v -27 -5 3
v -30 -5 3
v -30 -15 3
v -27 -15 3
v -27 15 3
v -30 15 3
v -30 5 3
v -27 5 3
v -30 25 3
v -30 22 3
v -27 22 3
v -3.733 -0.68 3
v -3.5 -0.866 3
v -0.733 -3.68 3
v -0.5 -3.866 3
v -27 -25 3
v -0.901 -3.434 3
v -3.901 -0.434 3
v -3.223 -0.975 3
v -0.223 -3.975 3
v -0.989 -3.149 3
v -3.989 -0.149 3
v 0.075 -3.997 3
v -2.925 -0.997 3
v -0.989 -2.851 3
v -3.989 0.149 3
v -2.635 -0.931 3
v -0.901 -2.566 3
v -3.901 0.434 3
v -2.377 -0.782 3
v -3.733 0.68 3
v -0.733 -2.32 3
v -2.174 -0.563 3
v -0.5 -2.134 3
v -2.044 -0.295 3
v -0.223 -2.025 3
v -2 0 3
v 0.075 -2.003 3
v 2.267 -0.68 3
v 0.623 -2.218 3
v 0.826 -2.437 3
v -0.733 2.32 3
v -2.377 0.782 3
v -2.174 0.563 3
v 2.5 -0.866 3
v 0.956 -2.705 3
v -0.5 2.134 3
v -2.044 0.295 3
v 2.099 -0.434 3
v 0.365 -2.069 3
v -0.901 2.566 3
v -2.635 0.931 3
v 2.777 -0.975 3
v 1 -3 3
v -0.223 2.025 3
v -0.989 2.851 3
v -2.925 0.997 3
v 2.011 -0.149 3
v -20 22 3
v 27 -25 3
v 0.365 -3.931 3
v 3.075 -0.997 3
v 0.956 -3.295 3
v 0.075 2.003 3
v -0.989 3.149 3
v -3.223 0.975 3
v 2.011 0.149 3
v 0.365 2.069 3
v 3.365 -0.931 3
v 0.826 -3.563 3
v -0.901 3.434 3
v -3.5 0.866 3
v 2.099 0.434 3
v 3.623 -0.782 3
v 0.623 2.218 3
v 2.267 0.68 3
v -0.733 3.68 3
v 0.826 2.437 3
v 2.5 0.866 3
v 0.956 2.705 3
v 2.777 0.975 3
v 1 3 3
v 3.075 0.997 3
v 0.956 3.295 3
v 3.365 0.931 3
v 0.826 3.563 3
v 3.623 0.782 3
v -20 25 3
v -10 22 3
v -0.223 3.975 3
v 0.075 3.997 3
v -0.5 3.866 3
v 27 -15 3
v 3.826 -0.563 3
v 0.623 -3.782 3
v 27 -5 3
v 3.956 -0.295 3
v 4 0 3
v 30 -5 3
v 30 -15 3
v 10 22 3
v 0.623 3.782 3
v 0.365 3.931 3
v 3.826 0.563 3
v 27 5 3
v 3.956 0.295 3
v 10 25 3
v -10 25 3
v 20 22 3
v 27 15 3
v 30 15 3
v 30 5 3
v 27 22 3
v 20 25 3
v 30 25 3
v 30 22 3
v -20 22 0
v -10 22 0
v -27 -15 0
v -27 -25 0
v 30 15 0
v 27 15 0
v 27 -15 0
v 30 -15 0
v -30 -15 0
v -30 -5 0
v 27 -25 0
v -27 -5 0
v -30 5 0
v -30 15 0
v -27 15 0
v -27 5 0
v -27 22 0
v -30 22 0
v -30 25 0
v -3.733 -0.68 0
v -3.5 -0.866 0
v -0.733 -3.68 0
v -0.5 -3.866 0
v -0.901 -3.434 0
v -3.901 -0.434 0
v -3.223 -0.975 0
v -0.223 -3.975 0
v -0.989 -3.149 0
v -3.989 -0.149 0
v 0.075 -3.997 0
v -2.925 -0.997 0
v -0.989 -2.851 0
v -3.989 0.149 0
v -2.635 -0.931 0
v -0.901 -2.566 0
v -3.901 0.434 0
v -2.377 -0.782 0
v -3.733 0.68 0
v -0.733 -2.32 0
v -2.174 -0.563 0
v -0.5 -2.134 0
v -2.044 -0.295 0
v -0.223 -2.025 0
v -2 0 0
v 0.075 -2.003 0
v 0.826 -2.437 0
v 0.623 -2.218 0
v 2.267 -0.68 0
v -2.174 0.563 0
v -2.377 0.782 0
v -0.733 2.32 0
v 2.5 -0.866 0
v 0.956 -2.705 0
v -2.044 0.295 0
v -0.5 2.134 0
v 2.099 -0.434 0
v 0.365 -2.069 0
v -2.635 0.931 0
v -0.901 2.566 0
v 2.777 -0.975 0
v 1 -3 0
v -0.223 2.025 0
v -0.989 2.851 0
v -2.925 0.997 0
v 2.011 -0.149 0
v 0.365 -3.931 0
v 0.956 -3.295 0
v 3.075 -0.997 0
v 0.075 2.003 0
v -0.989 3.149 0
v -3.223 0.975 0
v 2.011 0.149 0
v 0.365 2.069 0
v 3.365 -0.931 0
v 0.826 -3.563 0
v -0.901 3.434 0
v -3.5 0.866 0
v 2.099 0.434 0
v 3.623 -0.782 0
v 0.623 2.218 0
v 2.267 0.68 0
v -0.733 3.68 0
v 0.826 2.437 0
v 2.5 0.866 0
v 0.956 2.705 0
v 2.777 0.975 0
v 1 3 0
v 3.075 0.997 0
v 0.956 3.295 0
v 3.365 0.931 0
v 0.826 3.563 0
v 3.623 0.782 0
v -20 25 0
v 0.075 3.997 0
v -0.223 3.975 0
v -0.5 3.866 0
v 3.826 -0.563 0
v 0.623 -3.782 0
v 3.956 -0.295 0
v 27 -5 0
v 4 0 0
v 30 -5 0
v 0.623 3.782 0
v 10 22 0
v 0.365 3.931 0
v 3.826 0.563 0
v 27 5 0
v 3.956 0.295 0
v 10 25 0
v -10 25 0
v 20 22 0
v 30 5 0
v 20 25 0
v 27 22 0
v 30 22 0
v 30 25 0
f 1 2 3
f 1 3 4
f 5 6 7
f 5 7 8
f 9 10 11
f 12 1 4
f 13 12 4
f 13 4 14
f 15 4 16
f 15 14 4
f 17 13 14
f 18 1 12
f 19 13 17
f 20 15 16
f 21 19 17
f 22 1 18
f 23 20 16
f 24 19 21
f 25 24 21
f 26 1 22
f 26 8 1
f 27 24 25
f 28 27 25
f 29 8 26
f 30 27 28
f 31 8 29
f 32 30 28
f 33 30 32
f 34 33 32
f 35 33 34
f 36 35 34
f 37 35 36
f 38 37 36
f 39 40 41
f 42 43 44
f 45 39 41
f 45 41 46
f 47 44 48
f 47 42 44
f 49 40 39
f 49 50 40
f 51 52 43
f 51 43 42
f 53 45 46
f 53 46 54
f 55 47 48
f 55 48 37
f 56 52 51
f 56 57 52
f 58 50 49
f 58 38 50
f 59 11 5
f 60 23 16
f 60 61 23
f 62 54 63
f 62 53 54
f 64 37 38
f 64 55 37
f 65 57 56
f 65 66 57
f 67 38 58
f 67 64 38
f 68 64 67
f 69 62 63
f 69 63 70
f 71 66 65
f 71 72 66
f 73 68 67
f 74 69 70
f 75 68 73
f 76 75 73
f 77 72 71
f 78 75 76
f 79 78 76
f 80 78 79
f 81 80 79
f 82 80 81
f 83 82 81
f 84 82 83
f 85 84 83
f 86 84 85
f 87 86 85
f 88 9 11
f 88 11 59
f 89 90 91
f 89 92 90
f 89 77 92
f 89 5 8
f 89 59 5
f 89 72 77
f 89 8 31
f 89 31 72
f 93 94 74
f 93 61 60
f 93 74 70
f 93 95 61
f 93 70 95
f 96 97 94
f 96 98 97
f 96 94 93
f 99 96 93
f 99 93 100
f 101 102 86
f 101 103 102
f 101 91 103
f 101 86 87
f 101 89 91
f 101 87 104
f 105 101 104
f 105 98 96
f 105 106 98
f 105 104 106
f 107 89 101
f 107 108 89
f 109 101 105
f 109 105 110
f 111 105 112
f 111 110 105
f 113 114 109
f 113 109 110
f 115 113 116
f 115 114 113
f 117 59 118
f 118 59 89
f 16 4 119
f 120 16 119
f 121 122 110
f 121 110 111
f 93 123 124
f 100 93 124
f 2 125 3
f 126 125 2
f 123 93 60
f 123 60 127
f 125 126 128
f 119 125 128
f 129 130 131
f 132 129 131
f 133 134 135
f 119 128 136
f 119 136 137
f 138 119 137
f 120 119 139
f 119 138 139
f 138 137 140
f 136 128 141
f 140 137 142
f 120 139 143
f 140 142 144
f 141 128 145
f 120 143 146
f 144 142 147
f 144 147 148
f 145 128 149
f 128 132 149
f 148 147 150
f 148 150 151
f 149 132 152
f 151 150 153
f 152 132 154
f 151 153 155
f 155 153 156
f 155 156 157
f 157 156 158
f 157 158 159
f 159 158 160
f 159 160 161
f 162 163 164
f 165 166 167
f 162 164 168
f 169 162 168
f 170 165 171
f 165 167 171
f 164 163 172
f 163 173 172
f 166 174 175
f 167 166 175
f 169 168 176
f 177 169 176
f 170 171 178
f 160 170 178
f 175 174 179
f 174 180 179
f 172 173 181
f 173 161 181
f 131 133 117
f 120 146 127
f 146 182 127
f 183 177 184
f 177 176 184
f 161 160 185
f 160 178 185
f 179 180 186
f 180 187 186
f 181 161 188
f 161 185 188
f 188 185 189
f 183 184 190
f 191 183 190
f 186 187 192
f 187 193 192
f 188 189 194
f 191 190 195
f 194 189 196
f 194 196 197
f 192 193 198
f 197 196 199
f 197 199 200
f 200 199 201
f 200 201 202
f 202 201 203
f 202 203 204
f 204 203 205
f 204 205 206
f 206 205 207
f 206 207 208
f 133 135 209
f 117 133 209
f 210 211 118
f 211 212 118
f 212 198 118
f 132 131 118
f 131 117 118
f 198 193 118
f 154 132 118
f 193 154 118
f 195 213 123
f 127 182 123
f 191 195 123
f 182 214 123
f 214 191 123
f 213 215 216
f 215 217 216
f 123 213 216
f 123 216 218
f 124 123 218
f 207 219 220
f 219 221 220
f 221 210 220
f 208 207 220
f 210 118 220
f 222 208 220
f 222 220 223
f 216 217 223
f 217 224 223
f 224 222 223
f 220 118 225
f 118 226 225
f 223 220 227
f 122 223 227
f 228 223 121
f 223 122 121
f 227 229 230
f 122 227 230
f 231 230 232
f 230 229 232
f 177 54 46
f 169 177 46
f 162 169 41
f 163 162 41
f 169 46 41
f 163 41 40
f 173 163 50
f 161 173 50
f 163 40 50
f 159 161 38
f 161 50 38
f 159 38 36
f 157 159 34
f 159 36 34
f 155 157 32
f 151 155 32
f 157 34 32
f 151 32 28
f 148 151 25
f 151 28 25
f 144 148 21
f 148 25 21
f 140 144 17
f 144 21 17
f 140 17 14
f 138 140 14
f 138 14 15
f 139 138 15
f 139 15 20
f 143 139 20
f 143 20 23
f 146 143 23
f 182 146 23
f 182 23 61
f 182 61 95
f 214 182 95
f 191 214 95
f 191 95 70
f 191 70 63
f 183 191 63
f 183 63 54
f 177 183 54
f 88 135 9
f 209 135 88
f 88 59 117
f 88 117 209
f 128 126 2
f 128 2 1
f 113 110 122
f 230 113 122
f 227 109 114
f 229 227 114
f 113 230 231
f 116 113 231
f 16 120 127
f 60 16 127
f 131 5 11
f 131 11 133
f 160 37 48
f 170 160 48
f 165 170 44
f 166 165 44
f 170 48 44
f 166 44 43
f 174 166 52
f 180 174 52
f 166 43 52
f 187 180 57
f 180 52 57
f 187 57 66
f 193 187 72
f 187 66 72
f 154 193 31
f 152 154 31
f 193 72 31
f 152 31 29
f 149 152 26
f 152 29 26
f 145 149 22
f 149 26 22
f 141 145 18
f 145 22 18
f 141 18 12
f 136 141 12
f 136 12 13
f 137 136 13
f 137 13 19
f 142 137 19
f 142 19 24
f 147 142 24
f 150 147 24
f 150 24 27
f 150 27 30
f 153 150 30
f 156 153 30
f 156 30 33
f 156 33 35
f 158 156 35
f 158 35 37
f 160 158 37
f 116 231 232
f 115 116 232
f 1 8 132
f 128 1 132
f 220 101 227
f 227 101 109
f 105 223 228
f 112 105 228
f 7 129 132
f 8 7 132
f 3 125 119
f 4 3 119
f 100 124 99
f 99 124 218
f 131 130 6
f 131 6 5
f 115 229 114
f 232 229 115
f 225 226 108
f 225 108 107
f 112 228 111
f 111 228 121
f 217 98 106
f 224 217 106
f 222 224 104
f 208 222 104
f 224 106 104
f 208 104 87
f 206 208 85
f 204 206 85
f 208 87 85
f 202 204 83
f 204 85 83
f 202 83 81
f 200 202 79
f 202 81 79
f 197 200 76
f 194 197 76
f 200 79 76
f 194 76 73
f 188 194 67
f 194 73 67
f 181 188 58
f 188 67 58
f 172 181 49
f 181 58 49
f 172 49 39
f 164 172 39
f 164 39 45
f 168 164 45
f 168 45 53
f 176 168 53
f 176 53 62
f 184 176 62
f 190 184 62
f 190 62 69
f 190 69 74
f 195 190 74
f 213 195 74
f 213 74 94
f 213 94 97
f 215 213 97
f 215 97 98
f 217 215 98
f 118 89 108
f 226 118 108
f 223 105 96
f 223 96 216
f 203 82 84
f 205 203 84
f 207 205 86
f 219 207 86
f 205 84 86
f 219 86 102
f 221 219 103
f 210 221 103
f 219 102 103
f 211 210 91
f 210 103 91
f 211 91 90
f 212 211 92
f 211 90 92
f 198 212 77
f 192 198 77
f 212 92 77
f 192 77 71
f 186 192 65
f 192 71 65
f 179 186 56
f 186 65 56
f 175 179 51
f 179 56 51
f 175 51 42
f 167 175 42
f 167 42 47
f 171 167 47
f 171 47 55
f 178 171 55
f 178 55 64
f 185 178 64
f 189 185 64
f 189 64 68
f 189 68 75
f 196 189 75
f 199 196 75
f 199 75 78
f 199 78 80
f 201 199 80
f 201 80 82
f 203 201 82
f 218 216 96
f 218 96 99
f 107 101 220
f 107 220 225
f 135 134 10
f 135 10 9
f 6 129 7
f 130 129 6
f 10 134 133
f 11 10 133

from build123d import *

# Parameters (mm, degrees)
SKETCH1_W           = 60
SKETCH1_H           = 50
BOSS_EXTRUDE1_DEPTH = 3
SKETCH2_W           = 10
SKETCH2_H           = 3
CUT_EXTRUDE1_DEPTH  = 3
SKETCH3_R           = 1
CUT_EXTRUDE2_DEPTH  = 10
CAVITY3_START       = -25
CAVITY3_OUTLINE_W   = 3
CAVITY3_OUTLINE_H   = 3
CAVITY3_DEPTH       = 10
CAVITY3_START_2     = -5
CAVITY3_2_OUTLINE_W = 3
CAVITY3_2_OUTLINE_H = 3
CAVITY3_2_DEPTH     = 10
CAVITY3_START_3     = 15
CAVITY3_3_OUTLINE_W = 3
CAVITY3_3_OUTLINE_H = 3
CAVITY3_3_DEPTH     = 7


# Read off the part's stored shape, not the designer's step: Cavity3
with BuildPart() as part:
    # Sketch1 → Boss-Extrude1 (new body)
    with BuildSketch(Plane.XY):
        Rectangle(SKETCH1_W, SKETCH1_H)
    extrude(amount=BOSS_EXTRUDE1_DEPTH)

    # Sketch2 → Cut-Extrude1 (cut)
    with BuildSketch(Plane.XY.offset(3)):
        with Locations((-15, 23.5)):
            Rectangle(SKETCH2_W, SKETCH2_H)
        with Locations((15, 23.5)):
            Rectangle(SKETCH2_W, SKETCH2_H)
    extrude(amount=-CUT_EXTRUDE1_DEPTH, mode=Mode.SUBTRACT)

    # Sketch3 → Cut-Extrude2 (cut)
    with BuildSketch(Plane.XY.offset(3)):
        with Locations((0, 3)):
            Circle(SKETCH3_R)
        with Locations((3, 0)):
            Circle(SKETCH3_R)
        with Locations((0, -3)):
            Circle(SKETCH3_R)
        with Locations((-3, 0)):
            Circle(SKETCH3_R)
    extrude(amount=-CUT_EXTRUDE2_DEPTH, mode=Mode.SUBTRACT)

    # Cavity3 outline → Cavity3 (cut)
    with BuildSketch(Plane(origin=(0, 0, 0), x_dir=(1, 0, 0), z_dir=(0, 1, 0)).offset(CAVITY3_START)):
        with Locations((28.5, -1.5)):
            Rectangle(CAVITY3_OUTLINE_W, CAVITY3_OUTLINE_H)
        with Locations((-28.5, -1.5)):
            Rectangle(CAVITY3_OUTLINE_W, CAVITY3_OUTLINE_H)
    extrude(amount=CAVITY3_DEPTH, mode=Mode.SUBTRACT)

    # Cavity3 2 outline → Cavity3 2 (cut)
    with BuildSketch(Plane(origin=(0, 0, 0), x_dir=(1, 0, 0), z_dir=(0, 1, 0)).offset(CAVITY3_START_2)):
        with Locations((28.5, -1.5)):
            Rectangle(CAVITY3_2_OUTLINE_W, CAVITY3_2_OUTLINE_H)
        with Locations((-28.5, -1.5)):
            Rectangle(CAVITY3_2_OUTLINE_W, CAVITY3_2_OUTLINE_H)
    extrude(amount=CAVITY3_2_DEPTH, mode=Mode.SUBTRACT)

    # Cavity3 3 outline → Cavity3 3 (cut)
    with BuildSketch(Plane(origin=(0, 0, 0), x_dir=(1, 0, 0), z_dir=(0, 1, 0)).offset(CAVITY3_START_3)):
        with Locations((28.5, -1.5)):
            Rectangle(CAVITY3_3_OUTLINE_W, CAVITY3_3_OUTLINE_H)
        with Locations((-28.5, -1.5)):
            Rectangle(CAVITY3_3_OUTLINE_W, CAVITY3_3_OUTLINE_H)
    extrude(amount=CAVITY3_3_DEPTH, mode=Mode.SUBTRACT)


solid = part.part
